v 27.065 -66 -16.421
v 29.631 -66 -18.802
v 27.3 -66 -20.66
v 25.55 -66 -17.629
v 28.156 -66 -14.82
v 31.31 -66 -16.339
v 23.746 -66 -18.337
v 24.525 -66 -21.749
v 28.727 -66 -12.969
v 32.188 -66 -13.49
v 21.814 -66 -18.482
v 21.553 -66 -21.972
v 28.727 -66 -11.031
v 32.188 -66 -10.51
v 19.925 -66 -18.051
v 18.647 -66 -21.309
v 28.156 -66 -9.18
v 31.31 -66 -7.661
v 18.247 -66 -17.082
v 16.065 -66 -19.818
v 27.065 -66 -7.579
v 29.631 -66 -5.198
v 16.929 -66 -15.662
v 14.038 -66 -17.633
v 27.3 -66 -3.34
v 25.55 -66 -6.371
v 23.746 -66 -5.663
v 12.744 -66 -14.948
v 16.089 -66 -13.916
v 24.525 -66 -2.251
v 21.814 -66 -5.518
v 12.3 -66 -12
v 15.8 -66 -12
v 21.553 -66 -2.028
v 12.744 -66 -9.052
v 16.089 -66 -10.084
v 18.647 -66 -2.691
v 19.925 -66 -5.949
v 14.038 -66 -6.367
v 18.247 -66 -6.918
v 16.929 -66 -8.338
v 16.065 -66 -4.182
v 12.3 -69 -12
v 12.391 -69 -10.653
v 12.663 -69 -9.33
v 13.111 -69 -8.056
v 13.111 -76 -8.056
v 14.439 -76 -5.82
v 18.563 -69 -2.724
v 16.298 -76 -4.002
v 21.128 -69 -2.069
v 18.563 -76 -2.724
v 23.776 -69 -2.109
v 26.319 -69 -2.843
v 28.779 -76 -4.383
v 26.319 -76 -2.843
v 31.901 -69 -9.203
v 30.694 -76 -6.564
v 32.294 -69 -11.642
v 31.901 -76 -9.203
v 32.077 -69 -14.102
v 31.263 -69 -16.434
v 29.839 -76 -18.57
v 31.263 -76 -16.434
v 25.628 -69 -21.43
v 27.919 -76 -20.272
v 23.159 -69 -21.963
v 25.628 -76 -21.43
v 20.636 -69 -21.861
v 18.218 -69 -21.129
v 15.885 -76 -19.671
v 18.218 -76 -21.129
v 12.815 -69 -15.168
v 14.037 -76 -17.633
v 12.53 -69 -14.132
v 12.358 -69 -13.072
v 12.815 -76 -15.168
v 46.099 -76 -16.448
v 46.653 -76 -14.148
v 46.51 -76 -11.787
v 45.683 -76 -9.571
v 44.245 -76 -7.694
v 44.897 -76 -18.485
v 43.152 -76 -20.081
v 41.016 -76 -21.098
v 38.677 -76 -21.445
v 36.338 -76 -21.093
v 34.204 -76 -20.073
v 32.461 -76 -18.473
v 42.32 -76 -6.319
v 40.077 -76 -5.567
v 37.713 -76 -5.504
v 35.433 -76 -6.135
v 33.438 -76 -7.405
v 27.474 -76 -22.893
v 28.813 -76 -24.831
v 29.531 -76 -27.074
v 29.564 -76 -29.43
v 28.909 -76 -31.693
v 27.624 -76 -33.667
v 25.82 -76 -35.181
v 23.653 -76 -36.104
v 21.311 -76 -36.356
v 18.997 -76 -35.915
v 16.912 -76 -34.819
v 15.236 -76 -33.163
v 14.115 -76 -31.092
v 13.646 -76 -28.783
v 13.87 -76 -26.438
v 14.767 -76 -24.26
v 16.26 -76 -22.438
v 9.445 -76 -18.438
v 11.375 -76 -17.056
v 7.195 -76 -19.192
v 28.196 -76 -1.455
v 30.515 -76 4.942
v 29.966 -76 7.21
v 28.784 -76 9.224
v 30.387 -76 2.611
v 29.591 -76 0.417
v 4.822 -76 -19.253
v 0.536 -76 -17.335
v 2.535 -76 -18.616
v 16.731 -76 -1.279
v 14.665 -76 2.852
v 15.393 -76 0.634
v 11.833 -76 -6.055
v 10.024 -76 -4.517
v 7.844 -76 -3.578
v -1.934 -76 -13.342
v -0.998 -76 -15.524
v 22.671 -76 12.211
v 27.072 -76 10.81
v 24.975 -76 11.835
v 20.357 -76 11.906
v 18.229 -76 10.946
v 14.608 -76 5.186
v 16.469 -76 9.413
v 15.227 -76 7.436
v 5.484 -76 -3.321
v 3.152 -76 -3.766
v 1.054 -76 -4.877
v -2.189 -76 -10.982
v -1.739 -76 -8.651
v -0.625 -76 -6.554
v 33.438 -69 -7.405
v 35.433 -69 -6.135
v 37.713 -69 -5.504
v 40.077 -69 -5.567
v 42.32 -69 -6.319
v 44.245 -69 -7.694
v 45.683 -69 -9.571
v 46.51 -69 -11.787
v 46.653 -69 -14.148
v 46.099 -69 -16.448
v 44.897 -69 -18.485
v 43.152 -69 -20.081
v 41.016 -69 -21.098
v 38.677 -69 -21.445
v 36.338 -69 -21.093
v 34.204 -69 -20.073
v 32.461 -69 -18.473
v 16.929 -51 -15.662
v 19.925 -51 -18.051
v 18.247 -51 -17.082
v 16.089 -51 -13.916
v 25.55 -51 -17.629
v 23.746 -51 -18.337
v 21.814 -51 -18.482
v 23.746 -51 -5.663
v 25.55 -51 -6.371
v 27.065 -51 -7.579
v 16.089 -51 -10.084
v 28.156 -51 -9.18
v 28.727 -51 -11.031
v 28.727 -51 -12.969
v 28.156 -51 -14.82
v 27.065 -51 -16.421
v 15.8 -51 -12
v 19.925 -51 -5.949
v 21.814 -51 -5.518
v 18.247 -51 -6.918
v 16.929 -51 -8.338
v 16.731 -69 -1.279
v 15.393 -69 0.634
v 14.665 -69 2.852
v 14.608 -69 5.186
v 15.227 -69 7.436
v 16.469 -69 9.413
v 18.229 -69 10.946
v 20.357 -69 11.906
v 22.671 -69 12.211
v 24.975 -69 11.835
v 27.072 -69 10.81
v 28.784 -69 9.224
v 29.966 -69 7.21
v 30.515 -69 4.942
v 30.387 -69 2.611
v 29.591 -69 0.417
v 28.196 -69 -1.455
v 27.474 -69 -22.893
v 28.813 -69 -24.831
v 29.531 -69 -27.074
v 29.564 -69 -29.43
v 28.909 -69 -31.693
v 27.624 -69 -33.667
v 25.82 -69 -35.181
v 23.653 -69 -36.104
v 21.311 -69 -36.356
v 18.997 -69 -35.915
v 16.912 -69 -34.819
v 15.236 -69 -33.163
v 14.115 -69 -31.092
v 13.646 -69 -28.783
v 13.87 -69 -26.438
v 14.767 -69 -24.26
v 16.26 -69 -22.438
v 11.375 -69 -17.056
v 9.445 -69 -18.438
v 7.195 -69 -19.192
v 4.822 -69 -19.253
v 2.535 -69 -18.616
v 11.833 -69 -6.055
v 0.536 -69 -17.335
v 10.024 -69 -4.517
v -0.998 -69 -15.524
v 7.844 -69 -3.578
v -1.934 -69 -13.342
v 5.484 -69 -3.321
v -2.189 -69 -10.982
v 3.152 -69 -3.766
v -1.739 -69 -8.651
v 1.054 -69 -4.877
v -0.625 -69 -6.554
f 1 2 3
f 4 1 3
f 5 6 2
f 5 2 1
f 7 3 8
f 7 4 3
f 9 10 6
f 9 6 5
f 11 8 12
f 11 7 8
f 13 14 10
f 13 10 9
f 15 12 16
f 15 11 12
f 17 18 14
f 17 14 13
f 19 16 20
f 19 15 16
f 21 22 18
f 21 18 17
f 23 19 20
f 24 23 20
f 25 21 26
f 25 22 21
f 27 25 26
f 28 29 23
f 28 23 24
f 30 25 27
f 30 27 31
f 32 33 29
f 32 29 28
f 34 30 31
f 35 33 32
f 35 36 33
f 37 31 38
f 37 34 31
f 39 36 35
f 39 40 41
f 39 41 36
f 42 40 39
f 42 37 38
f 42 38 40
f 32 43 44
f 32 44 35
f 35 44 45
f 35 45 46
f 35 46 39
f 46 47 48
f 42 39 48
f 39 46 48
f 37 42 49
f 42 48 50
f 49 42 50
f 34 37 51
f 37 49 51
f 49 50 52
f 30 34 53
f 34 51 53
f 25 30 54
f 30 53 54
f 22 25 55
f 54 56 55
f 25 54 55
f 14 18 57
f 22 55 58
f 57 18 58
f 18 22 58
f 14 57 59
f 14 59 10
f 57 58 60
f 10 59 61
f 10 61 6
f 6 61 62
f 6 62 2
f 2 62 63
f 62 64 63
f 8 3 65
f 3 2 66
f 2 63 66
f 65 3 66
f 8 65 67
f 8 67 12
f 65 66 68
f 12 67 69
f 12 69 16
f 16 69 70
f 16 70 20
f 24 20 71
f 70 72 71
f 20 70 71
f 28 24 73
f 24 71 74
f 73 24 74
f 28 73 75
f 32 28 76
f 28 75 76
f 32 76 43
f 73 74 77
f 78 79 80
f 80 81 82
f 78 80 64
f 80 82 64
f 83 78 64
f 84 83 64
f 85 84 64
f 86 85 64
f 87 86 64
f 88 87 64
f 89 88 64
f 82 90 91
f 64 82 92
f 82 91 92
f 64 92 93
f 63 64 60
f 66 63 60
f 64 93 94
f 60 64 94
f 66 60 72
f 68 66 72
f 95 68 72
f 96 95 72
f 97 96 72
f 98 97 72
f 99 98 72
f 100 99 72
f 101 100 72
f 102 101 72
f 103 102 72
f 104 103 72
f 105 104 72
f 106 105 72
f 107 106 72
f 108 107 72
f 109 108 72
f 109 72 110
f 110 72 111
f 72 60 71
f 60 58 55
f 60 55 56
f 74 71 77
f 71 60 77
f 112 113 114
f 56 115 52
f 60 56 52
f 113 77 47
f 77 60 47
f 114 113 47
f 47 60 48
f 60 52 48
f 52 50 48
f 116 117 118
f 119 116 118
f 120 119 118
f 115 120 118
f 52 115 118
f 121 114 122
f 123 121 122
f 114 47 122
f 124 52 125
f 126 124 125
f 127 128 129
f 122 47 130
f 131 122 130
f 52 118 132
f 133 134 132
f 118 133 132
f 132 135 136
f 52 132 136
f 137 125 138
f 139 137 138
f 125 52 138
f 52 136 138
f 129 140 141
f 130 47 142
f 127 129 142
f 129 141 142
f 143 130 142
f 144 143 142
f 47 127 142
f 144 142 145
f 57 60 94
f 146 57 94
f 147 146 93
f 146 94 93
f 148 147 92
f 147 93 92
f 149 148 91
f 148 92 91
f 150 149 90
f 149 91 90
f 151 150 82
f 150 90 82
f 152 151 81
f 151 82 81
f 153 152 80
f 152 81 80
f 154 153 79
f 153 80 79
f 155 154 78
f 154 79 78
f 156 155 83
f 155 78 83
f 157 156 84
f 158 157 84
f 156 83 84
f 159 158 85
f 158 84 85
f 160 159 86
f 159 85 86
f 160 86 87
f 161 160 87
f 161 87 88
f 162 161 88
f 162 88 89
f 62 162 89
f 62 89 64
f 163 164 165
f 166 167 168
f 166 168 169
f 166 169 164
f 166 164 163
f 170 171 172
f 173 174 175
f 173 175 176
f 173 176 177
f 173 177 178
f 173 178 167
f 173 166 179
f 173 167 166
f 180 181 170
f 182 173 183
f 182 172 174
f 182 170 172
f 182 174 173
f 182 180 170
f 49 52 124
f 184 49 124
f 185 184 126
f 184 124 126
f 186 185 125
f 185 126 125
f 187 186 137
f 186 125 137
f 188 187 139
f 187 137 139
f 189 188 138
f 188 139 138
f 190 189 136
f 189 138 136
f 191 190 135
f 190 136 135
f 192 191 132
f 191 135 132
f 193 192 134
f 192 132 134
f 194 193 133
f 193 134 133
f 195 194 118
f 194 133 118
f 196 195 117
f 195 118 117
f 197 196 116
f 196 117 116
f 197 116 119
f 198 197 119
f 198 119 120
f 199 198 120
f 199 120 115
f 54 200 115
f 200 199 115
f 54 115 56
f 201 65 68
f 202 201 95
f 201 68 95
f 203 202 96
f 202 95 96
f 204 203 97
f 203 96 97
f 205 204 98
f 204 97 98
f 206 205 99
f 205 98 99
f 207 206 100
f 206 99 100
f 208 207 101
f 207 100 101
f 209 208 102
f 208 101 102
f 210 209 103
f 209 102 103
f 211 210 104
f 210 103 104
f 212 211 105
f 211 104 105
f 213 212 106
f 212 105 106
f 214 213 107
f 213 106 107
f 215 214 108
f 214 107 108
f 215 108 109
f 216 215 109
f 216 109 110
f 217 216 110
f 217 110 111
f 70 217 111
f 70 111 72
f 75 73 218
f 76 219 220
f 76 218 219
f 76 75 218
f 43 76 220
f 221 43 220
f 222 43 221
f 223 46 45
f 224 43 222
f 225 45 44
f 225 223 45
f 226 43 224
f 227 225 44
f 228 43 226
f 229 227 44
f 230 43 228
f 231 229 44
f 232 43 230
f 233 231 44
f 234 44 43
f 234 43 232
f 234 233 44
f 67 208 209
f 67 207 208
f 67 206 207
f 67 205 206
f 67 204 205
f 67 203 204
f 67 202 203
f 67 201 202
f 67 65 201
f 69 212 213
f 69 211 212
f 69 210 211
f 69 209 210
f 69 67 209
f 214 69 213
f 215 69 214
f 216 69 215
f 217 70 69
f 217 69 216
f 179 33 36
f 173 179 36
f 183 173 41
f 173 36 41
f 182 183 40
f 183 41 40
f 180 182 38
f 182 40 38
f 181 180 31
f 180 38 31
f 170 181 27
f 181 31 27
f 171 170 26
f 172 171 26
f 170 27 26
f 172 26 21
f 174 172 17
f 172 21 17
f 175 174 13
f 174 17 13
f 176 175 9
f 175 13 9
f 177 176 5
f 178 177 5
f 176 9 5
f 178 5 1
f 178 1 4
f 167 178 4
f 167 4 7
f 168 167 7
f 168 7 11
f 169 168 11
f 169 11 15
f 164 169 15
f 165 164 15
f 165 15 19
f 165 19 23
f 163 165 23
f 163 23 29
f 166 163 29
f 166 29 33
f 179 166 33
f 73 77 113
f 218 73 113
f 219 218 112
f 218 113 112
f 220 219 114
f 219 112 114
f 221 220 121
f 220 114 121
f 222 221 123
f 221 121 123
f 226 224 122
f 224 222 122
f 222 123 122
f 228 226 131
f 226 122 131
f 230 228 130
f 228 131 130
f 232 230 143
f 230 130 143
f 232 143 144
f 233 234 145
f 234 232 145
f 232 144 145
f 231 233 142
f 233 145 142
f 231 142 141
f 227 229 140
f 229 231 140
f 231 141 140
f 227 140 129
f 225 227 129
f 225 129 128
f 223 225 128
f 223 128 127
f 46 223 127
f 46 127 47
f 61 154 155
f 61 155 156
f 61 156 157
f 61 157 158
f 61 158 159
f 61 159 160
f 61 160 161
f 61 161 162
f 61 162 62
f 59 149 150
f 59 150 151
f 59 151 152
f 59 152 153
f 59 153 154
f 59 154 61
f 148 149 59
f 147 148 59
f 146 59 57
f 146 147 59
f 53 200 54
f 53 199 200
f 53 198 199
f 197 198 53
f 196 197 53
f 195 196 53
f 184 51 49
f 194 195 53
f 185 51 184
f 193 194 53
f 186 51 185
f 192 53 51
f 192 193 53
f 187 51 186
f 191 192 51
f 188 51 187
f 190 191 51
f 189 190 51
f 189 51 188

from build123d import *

# Parameters (mm, degrees)
CYLINDER011_R             = 8
CYLINDER011_DEPTH         = 7
CYLINDER012_R             = 8
CYLINDER012_DEPTH         = 7
CYLINDER010_R             = 8
CYLINDER010_DEPTH         = 7
CYLINDER009_R             = 8
CYLINDER009_DEPTH         = 7
CYLINDER005_R             = 6.5
CYLINDER005_DEPTH         = 25
CYLINDER006_R             = 10
CYLINDER006_DEPTH         = 10
FUSION001_ROLL_ANGLE      = 90
FUSION001_PITCH_ANGLE     = -7e-06
FUSION001_PLACEMENT_ANGLE = -179.999993


with BuildPart() as cylinder011:
    # Cylinder011 → Cylinder011 (new body)
    with BuildSketch(Plane(origin=(16.4955, 0.685902, 0), x_dir=(1, 0, 0), z_dir=(0, 0, 1))):
        Circle(CYLINDER011_R)
    extrude(amount=CYLINDER011_DEPTH)


with BuildPart() as cylinder012:
    # Cylinder012 → Cylinder012 (new body)
    with BuildSketch(Plane(origin=(-16.3838, -1.44516, 0), x_dir=(1, 0, 0), z_dir=(0, 0, 1))):
        Circle(CYLINDER012_R)
    extrude(amount=CYLINDER012_DEPTH)


with BuildPart() as cylinder010:
    # Cylinder010 → Cylinder010 (new body)
    with BuildSketch(Plane(origin=(0.664718, -16.3626, 0), x_dir=(1, 0, 0), z_dir=(0, 0, 1))):
        Circle(CYLINDER010_R)
    extrude(amount=CYLINDER010_DEPTH)


with BuildPart() as cylinder009:
    # Cylinder009 → Cylinder009 (new body)
    with BuildSketch(Plane(origin=(-0.248596, 16.2122, 0), x_dir=(1, 0, 0), z_dir=(0, 0, 1))):
        Circle(CYLINDER009_R)
    extrude(amount=CYLINDER009_DEPTH)


with BuildPart() as cylinder005:
    # Cylinder005 → Cylinder005 (new body)
    with BuildSketch(Plane.XY):
        Circle(CYLINDER005_R)
    extrude(amount=CYLINDER005_DEPTH)


with BuildPart() as fusion001:
    # Cylinder006 → Cylinder006 (new body)
    with BuildSketch(Plane.XY):
        Circle(CYLINDER006_R)
    extrude(amount=CYLINDER006_DEPTH)

    # Fusion001: union Cylinder011, Cylinder012, Cylinder010, Cylinder009, Cylinder005
    add(cylinder011.part)
    add(cylinder012.part)
    add(cylinder010.part)
    add(cylinder009.part)
    add(cylinder005.part)


with BuildPart() as fusion001_1:
    # Fusion001 roll: moved
    add(fusion001.part.rotate(Axis((0, 0, 0), (1, 0, 0)), FUSION001_ROLL_ANGLE))


with BuildPart() as fusion001_2:
    # Fusion001 pitch: moved
    add(fusion001_1.part.rotate(Axis((0, 0, 0), (0, 1, 0)), FUSION001_PITCH_ANGLE))


with BuildPart() as fusion001_3:
    # Fusion001 placement: moved
    add(fusion001_2.part.moved(Location((22.3, -76, -12))).rotate(Axis((22.3, -76, -12), (0, 0, 1)), FUSION001_PLACEMENT_ANGLE))


solid = fusion001_3.part
